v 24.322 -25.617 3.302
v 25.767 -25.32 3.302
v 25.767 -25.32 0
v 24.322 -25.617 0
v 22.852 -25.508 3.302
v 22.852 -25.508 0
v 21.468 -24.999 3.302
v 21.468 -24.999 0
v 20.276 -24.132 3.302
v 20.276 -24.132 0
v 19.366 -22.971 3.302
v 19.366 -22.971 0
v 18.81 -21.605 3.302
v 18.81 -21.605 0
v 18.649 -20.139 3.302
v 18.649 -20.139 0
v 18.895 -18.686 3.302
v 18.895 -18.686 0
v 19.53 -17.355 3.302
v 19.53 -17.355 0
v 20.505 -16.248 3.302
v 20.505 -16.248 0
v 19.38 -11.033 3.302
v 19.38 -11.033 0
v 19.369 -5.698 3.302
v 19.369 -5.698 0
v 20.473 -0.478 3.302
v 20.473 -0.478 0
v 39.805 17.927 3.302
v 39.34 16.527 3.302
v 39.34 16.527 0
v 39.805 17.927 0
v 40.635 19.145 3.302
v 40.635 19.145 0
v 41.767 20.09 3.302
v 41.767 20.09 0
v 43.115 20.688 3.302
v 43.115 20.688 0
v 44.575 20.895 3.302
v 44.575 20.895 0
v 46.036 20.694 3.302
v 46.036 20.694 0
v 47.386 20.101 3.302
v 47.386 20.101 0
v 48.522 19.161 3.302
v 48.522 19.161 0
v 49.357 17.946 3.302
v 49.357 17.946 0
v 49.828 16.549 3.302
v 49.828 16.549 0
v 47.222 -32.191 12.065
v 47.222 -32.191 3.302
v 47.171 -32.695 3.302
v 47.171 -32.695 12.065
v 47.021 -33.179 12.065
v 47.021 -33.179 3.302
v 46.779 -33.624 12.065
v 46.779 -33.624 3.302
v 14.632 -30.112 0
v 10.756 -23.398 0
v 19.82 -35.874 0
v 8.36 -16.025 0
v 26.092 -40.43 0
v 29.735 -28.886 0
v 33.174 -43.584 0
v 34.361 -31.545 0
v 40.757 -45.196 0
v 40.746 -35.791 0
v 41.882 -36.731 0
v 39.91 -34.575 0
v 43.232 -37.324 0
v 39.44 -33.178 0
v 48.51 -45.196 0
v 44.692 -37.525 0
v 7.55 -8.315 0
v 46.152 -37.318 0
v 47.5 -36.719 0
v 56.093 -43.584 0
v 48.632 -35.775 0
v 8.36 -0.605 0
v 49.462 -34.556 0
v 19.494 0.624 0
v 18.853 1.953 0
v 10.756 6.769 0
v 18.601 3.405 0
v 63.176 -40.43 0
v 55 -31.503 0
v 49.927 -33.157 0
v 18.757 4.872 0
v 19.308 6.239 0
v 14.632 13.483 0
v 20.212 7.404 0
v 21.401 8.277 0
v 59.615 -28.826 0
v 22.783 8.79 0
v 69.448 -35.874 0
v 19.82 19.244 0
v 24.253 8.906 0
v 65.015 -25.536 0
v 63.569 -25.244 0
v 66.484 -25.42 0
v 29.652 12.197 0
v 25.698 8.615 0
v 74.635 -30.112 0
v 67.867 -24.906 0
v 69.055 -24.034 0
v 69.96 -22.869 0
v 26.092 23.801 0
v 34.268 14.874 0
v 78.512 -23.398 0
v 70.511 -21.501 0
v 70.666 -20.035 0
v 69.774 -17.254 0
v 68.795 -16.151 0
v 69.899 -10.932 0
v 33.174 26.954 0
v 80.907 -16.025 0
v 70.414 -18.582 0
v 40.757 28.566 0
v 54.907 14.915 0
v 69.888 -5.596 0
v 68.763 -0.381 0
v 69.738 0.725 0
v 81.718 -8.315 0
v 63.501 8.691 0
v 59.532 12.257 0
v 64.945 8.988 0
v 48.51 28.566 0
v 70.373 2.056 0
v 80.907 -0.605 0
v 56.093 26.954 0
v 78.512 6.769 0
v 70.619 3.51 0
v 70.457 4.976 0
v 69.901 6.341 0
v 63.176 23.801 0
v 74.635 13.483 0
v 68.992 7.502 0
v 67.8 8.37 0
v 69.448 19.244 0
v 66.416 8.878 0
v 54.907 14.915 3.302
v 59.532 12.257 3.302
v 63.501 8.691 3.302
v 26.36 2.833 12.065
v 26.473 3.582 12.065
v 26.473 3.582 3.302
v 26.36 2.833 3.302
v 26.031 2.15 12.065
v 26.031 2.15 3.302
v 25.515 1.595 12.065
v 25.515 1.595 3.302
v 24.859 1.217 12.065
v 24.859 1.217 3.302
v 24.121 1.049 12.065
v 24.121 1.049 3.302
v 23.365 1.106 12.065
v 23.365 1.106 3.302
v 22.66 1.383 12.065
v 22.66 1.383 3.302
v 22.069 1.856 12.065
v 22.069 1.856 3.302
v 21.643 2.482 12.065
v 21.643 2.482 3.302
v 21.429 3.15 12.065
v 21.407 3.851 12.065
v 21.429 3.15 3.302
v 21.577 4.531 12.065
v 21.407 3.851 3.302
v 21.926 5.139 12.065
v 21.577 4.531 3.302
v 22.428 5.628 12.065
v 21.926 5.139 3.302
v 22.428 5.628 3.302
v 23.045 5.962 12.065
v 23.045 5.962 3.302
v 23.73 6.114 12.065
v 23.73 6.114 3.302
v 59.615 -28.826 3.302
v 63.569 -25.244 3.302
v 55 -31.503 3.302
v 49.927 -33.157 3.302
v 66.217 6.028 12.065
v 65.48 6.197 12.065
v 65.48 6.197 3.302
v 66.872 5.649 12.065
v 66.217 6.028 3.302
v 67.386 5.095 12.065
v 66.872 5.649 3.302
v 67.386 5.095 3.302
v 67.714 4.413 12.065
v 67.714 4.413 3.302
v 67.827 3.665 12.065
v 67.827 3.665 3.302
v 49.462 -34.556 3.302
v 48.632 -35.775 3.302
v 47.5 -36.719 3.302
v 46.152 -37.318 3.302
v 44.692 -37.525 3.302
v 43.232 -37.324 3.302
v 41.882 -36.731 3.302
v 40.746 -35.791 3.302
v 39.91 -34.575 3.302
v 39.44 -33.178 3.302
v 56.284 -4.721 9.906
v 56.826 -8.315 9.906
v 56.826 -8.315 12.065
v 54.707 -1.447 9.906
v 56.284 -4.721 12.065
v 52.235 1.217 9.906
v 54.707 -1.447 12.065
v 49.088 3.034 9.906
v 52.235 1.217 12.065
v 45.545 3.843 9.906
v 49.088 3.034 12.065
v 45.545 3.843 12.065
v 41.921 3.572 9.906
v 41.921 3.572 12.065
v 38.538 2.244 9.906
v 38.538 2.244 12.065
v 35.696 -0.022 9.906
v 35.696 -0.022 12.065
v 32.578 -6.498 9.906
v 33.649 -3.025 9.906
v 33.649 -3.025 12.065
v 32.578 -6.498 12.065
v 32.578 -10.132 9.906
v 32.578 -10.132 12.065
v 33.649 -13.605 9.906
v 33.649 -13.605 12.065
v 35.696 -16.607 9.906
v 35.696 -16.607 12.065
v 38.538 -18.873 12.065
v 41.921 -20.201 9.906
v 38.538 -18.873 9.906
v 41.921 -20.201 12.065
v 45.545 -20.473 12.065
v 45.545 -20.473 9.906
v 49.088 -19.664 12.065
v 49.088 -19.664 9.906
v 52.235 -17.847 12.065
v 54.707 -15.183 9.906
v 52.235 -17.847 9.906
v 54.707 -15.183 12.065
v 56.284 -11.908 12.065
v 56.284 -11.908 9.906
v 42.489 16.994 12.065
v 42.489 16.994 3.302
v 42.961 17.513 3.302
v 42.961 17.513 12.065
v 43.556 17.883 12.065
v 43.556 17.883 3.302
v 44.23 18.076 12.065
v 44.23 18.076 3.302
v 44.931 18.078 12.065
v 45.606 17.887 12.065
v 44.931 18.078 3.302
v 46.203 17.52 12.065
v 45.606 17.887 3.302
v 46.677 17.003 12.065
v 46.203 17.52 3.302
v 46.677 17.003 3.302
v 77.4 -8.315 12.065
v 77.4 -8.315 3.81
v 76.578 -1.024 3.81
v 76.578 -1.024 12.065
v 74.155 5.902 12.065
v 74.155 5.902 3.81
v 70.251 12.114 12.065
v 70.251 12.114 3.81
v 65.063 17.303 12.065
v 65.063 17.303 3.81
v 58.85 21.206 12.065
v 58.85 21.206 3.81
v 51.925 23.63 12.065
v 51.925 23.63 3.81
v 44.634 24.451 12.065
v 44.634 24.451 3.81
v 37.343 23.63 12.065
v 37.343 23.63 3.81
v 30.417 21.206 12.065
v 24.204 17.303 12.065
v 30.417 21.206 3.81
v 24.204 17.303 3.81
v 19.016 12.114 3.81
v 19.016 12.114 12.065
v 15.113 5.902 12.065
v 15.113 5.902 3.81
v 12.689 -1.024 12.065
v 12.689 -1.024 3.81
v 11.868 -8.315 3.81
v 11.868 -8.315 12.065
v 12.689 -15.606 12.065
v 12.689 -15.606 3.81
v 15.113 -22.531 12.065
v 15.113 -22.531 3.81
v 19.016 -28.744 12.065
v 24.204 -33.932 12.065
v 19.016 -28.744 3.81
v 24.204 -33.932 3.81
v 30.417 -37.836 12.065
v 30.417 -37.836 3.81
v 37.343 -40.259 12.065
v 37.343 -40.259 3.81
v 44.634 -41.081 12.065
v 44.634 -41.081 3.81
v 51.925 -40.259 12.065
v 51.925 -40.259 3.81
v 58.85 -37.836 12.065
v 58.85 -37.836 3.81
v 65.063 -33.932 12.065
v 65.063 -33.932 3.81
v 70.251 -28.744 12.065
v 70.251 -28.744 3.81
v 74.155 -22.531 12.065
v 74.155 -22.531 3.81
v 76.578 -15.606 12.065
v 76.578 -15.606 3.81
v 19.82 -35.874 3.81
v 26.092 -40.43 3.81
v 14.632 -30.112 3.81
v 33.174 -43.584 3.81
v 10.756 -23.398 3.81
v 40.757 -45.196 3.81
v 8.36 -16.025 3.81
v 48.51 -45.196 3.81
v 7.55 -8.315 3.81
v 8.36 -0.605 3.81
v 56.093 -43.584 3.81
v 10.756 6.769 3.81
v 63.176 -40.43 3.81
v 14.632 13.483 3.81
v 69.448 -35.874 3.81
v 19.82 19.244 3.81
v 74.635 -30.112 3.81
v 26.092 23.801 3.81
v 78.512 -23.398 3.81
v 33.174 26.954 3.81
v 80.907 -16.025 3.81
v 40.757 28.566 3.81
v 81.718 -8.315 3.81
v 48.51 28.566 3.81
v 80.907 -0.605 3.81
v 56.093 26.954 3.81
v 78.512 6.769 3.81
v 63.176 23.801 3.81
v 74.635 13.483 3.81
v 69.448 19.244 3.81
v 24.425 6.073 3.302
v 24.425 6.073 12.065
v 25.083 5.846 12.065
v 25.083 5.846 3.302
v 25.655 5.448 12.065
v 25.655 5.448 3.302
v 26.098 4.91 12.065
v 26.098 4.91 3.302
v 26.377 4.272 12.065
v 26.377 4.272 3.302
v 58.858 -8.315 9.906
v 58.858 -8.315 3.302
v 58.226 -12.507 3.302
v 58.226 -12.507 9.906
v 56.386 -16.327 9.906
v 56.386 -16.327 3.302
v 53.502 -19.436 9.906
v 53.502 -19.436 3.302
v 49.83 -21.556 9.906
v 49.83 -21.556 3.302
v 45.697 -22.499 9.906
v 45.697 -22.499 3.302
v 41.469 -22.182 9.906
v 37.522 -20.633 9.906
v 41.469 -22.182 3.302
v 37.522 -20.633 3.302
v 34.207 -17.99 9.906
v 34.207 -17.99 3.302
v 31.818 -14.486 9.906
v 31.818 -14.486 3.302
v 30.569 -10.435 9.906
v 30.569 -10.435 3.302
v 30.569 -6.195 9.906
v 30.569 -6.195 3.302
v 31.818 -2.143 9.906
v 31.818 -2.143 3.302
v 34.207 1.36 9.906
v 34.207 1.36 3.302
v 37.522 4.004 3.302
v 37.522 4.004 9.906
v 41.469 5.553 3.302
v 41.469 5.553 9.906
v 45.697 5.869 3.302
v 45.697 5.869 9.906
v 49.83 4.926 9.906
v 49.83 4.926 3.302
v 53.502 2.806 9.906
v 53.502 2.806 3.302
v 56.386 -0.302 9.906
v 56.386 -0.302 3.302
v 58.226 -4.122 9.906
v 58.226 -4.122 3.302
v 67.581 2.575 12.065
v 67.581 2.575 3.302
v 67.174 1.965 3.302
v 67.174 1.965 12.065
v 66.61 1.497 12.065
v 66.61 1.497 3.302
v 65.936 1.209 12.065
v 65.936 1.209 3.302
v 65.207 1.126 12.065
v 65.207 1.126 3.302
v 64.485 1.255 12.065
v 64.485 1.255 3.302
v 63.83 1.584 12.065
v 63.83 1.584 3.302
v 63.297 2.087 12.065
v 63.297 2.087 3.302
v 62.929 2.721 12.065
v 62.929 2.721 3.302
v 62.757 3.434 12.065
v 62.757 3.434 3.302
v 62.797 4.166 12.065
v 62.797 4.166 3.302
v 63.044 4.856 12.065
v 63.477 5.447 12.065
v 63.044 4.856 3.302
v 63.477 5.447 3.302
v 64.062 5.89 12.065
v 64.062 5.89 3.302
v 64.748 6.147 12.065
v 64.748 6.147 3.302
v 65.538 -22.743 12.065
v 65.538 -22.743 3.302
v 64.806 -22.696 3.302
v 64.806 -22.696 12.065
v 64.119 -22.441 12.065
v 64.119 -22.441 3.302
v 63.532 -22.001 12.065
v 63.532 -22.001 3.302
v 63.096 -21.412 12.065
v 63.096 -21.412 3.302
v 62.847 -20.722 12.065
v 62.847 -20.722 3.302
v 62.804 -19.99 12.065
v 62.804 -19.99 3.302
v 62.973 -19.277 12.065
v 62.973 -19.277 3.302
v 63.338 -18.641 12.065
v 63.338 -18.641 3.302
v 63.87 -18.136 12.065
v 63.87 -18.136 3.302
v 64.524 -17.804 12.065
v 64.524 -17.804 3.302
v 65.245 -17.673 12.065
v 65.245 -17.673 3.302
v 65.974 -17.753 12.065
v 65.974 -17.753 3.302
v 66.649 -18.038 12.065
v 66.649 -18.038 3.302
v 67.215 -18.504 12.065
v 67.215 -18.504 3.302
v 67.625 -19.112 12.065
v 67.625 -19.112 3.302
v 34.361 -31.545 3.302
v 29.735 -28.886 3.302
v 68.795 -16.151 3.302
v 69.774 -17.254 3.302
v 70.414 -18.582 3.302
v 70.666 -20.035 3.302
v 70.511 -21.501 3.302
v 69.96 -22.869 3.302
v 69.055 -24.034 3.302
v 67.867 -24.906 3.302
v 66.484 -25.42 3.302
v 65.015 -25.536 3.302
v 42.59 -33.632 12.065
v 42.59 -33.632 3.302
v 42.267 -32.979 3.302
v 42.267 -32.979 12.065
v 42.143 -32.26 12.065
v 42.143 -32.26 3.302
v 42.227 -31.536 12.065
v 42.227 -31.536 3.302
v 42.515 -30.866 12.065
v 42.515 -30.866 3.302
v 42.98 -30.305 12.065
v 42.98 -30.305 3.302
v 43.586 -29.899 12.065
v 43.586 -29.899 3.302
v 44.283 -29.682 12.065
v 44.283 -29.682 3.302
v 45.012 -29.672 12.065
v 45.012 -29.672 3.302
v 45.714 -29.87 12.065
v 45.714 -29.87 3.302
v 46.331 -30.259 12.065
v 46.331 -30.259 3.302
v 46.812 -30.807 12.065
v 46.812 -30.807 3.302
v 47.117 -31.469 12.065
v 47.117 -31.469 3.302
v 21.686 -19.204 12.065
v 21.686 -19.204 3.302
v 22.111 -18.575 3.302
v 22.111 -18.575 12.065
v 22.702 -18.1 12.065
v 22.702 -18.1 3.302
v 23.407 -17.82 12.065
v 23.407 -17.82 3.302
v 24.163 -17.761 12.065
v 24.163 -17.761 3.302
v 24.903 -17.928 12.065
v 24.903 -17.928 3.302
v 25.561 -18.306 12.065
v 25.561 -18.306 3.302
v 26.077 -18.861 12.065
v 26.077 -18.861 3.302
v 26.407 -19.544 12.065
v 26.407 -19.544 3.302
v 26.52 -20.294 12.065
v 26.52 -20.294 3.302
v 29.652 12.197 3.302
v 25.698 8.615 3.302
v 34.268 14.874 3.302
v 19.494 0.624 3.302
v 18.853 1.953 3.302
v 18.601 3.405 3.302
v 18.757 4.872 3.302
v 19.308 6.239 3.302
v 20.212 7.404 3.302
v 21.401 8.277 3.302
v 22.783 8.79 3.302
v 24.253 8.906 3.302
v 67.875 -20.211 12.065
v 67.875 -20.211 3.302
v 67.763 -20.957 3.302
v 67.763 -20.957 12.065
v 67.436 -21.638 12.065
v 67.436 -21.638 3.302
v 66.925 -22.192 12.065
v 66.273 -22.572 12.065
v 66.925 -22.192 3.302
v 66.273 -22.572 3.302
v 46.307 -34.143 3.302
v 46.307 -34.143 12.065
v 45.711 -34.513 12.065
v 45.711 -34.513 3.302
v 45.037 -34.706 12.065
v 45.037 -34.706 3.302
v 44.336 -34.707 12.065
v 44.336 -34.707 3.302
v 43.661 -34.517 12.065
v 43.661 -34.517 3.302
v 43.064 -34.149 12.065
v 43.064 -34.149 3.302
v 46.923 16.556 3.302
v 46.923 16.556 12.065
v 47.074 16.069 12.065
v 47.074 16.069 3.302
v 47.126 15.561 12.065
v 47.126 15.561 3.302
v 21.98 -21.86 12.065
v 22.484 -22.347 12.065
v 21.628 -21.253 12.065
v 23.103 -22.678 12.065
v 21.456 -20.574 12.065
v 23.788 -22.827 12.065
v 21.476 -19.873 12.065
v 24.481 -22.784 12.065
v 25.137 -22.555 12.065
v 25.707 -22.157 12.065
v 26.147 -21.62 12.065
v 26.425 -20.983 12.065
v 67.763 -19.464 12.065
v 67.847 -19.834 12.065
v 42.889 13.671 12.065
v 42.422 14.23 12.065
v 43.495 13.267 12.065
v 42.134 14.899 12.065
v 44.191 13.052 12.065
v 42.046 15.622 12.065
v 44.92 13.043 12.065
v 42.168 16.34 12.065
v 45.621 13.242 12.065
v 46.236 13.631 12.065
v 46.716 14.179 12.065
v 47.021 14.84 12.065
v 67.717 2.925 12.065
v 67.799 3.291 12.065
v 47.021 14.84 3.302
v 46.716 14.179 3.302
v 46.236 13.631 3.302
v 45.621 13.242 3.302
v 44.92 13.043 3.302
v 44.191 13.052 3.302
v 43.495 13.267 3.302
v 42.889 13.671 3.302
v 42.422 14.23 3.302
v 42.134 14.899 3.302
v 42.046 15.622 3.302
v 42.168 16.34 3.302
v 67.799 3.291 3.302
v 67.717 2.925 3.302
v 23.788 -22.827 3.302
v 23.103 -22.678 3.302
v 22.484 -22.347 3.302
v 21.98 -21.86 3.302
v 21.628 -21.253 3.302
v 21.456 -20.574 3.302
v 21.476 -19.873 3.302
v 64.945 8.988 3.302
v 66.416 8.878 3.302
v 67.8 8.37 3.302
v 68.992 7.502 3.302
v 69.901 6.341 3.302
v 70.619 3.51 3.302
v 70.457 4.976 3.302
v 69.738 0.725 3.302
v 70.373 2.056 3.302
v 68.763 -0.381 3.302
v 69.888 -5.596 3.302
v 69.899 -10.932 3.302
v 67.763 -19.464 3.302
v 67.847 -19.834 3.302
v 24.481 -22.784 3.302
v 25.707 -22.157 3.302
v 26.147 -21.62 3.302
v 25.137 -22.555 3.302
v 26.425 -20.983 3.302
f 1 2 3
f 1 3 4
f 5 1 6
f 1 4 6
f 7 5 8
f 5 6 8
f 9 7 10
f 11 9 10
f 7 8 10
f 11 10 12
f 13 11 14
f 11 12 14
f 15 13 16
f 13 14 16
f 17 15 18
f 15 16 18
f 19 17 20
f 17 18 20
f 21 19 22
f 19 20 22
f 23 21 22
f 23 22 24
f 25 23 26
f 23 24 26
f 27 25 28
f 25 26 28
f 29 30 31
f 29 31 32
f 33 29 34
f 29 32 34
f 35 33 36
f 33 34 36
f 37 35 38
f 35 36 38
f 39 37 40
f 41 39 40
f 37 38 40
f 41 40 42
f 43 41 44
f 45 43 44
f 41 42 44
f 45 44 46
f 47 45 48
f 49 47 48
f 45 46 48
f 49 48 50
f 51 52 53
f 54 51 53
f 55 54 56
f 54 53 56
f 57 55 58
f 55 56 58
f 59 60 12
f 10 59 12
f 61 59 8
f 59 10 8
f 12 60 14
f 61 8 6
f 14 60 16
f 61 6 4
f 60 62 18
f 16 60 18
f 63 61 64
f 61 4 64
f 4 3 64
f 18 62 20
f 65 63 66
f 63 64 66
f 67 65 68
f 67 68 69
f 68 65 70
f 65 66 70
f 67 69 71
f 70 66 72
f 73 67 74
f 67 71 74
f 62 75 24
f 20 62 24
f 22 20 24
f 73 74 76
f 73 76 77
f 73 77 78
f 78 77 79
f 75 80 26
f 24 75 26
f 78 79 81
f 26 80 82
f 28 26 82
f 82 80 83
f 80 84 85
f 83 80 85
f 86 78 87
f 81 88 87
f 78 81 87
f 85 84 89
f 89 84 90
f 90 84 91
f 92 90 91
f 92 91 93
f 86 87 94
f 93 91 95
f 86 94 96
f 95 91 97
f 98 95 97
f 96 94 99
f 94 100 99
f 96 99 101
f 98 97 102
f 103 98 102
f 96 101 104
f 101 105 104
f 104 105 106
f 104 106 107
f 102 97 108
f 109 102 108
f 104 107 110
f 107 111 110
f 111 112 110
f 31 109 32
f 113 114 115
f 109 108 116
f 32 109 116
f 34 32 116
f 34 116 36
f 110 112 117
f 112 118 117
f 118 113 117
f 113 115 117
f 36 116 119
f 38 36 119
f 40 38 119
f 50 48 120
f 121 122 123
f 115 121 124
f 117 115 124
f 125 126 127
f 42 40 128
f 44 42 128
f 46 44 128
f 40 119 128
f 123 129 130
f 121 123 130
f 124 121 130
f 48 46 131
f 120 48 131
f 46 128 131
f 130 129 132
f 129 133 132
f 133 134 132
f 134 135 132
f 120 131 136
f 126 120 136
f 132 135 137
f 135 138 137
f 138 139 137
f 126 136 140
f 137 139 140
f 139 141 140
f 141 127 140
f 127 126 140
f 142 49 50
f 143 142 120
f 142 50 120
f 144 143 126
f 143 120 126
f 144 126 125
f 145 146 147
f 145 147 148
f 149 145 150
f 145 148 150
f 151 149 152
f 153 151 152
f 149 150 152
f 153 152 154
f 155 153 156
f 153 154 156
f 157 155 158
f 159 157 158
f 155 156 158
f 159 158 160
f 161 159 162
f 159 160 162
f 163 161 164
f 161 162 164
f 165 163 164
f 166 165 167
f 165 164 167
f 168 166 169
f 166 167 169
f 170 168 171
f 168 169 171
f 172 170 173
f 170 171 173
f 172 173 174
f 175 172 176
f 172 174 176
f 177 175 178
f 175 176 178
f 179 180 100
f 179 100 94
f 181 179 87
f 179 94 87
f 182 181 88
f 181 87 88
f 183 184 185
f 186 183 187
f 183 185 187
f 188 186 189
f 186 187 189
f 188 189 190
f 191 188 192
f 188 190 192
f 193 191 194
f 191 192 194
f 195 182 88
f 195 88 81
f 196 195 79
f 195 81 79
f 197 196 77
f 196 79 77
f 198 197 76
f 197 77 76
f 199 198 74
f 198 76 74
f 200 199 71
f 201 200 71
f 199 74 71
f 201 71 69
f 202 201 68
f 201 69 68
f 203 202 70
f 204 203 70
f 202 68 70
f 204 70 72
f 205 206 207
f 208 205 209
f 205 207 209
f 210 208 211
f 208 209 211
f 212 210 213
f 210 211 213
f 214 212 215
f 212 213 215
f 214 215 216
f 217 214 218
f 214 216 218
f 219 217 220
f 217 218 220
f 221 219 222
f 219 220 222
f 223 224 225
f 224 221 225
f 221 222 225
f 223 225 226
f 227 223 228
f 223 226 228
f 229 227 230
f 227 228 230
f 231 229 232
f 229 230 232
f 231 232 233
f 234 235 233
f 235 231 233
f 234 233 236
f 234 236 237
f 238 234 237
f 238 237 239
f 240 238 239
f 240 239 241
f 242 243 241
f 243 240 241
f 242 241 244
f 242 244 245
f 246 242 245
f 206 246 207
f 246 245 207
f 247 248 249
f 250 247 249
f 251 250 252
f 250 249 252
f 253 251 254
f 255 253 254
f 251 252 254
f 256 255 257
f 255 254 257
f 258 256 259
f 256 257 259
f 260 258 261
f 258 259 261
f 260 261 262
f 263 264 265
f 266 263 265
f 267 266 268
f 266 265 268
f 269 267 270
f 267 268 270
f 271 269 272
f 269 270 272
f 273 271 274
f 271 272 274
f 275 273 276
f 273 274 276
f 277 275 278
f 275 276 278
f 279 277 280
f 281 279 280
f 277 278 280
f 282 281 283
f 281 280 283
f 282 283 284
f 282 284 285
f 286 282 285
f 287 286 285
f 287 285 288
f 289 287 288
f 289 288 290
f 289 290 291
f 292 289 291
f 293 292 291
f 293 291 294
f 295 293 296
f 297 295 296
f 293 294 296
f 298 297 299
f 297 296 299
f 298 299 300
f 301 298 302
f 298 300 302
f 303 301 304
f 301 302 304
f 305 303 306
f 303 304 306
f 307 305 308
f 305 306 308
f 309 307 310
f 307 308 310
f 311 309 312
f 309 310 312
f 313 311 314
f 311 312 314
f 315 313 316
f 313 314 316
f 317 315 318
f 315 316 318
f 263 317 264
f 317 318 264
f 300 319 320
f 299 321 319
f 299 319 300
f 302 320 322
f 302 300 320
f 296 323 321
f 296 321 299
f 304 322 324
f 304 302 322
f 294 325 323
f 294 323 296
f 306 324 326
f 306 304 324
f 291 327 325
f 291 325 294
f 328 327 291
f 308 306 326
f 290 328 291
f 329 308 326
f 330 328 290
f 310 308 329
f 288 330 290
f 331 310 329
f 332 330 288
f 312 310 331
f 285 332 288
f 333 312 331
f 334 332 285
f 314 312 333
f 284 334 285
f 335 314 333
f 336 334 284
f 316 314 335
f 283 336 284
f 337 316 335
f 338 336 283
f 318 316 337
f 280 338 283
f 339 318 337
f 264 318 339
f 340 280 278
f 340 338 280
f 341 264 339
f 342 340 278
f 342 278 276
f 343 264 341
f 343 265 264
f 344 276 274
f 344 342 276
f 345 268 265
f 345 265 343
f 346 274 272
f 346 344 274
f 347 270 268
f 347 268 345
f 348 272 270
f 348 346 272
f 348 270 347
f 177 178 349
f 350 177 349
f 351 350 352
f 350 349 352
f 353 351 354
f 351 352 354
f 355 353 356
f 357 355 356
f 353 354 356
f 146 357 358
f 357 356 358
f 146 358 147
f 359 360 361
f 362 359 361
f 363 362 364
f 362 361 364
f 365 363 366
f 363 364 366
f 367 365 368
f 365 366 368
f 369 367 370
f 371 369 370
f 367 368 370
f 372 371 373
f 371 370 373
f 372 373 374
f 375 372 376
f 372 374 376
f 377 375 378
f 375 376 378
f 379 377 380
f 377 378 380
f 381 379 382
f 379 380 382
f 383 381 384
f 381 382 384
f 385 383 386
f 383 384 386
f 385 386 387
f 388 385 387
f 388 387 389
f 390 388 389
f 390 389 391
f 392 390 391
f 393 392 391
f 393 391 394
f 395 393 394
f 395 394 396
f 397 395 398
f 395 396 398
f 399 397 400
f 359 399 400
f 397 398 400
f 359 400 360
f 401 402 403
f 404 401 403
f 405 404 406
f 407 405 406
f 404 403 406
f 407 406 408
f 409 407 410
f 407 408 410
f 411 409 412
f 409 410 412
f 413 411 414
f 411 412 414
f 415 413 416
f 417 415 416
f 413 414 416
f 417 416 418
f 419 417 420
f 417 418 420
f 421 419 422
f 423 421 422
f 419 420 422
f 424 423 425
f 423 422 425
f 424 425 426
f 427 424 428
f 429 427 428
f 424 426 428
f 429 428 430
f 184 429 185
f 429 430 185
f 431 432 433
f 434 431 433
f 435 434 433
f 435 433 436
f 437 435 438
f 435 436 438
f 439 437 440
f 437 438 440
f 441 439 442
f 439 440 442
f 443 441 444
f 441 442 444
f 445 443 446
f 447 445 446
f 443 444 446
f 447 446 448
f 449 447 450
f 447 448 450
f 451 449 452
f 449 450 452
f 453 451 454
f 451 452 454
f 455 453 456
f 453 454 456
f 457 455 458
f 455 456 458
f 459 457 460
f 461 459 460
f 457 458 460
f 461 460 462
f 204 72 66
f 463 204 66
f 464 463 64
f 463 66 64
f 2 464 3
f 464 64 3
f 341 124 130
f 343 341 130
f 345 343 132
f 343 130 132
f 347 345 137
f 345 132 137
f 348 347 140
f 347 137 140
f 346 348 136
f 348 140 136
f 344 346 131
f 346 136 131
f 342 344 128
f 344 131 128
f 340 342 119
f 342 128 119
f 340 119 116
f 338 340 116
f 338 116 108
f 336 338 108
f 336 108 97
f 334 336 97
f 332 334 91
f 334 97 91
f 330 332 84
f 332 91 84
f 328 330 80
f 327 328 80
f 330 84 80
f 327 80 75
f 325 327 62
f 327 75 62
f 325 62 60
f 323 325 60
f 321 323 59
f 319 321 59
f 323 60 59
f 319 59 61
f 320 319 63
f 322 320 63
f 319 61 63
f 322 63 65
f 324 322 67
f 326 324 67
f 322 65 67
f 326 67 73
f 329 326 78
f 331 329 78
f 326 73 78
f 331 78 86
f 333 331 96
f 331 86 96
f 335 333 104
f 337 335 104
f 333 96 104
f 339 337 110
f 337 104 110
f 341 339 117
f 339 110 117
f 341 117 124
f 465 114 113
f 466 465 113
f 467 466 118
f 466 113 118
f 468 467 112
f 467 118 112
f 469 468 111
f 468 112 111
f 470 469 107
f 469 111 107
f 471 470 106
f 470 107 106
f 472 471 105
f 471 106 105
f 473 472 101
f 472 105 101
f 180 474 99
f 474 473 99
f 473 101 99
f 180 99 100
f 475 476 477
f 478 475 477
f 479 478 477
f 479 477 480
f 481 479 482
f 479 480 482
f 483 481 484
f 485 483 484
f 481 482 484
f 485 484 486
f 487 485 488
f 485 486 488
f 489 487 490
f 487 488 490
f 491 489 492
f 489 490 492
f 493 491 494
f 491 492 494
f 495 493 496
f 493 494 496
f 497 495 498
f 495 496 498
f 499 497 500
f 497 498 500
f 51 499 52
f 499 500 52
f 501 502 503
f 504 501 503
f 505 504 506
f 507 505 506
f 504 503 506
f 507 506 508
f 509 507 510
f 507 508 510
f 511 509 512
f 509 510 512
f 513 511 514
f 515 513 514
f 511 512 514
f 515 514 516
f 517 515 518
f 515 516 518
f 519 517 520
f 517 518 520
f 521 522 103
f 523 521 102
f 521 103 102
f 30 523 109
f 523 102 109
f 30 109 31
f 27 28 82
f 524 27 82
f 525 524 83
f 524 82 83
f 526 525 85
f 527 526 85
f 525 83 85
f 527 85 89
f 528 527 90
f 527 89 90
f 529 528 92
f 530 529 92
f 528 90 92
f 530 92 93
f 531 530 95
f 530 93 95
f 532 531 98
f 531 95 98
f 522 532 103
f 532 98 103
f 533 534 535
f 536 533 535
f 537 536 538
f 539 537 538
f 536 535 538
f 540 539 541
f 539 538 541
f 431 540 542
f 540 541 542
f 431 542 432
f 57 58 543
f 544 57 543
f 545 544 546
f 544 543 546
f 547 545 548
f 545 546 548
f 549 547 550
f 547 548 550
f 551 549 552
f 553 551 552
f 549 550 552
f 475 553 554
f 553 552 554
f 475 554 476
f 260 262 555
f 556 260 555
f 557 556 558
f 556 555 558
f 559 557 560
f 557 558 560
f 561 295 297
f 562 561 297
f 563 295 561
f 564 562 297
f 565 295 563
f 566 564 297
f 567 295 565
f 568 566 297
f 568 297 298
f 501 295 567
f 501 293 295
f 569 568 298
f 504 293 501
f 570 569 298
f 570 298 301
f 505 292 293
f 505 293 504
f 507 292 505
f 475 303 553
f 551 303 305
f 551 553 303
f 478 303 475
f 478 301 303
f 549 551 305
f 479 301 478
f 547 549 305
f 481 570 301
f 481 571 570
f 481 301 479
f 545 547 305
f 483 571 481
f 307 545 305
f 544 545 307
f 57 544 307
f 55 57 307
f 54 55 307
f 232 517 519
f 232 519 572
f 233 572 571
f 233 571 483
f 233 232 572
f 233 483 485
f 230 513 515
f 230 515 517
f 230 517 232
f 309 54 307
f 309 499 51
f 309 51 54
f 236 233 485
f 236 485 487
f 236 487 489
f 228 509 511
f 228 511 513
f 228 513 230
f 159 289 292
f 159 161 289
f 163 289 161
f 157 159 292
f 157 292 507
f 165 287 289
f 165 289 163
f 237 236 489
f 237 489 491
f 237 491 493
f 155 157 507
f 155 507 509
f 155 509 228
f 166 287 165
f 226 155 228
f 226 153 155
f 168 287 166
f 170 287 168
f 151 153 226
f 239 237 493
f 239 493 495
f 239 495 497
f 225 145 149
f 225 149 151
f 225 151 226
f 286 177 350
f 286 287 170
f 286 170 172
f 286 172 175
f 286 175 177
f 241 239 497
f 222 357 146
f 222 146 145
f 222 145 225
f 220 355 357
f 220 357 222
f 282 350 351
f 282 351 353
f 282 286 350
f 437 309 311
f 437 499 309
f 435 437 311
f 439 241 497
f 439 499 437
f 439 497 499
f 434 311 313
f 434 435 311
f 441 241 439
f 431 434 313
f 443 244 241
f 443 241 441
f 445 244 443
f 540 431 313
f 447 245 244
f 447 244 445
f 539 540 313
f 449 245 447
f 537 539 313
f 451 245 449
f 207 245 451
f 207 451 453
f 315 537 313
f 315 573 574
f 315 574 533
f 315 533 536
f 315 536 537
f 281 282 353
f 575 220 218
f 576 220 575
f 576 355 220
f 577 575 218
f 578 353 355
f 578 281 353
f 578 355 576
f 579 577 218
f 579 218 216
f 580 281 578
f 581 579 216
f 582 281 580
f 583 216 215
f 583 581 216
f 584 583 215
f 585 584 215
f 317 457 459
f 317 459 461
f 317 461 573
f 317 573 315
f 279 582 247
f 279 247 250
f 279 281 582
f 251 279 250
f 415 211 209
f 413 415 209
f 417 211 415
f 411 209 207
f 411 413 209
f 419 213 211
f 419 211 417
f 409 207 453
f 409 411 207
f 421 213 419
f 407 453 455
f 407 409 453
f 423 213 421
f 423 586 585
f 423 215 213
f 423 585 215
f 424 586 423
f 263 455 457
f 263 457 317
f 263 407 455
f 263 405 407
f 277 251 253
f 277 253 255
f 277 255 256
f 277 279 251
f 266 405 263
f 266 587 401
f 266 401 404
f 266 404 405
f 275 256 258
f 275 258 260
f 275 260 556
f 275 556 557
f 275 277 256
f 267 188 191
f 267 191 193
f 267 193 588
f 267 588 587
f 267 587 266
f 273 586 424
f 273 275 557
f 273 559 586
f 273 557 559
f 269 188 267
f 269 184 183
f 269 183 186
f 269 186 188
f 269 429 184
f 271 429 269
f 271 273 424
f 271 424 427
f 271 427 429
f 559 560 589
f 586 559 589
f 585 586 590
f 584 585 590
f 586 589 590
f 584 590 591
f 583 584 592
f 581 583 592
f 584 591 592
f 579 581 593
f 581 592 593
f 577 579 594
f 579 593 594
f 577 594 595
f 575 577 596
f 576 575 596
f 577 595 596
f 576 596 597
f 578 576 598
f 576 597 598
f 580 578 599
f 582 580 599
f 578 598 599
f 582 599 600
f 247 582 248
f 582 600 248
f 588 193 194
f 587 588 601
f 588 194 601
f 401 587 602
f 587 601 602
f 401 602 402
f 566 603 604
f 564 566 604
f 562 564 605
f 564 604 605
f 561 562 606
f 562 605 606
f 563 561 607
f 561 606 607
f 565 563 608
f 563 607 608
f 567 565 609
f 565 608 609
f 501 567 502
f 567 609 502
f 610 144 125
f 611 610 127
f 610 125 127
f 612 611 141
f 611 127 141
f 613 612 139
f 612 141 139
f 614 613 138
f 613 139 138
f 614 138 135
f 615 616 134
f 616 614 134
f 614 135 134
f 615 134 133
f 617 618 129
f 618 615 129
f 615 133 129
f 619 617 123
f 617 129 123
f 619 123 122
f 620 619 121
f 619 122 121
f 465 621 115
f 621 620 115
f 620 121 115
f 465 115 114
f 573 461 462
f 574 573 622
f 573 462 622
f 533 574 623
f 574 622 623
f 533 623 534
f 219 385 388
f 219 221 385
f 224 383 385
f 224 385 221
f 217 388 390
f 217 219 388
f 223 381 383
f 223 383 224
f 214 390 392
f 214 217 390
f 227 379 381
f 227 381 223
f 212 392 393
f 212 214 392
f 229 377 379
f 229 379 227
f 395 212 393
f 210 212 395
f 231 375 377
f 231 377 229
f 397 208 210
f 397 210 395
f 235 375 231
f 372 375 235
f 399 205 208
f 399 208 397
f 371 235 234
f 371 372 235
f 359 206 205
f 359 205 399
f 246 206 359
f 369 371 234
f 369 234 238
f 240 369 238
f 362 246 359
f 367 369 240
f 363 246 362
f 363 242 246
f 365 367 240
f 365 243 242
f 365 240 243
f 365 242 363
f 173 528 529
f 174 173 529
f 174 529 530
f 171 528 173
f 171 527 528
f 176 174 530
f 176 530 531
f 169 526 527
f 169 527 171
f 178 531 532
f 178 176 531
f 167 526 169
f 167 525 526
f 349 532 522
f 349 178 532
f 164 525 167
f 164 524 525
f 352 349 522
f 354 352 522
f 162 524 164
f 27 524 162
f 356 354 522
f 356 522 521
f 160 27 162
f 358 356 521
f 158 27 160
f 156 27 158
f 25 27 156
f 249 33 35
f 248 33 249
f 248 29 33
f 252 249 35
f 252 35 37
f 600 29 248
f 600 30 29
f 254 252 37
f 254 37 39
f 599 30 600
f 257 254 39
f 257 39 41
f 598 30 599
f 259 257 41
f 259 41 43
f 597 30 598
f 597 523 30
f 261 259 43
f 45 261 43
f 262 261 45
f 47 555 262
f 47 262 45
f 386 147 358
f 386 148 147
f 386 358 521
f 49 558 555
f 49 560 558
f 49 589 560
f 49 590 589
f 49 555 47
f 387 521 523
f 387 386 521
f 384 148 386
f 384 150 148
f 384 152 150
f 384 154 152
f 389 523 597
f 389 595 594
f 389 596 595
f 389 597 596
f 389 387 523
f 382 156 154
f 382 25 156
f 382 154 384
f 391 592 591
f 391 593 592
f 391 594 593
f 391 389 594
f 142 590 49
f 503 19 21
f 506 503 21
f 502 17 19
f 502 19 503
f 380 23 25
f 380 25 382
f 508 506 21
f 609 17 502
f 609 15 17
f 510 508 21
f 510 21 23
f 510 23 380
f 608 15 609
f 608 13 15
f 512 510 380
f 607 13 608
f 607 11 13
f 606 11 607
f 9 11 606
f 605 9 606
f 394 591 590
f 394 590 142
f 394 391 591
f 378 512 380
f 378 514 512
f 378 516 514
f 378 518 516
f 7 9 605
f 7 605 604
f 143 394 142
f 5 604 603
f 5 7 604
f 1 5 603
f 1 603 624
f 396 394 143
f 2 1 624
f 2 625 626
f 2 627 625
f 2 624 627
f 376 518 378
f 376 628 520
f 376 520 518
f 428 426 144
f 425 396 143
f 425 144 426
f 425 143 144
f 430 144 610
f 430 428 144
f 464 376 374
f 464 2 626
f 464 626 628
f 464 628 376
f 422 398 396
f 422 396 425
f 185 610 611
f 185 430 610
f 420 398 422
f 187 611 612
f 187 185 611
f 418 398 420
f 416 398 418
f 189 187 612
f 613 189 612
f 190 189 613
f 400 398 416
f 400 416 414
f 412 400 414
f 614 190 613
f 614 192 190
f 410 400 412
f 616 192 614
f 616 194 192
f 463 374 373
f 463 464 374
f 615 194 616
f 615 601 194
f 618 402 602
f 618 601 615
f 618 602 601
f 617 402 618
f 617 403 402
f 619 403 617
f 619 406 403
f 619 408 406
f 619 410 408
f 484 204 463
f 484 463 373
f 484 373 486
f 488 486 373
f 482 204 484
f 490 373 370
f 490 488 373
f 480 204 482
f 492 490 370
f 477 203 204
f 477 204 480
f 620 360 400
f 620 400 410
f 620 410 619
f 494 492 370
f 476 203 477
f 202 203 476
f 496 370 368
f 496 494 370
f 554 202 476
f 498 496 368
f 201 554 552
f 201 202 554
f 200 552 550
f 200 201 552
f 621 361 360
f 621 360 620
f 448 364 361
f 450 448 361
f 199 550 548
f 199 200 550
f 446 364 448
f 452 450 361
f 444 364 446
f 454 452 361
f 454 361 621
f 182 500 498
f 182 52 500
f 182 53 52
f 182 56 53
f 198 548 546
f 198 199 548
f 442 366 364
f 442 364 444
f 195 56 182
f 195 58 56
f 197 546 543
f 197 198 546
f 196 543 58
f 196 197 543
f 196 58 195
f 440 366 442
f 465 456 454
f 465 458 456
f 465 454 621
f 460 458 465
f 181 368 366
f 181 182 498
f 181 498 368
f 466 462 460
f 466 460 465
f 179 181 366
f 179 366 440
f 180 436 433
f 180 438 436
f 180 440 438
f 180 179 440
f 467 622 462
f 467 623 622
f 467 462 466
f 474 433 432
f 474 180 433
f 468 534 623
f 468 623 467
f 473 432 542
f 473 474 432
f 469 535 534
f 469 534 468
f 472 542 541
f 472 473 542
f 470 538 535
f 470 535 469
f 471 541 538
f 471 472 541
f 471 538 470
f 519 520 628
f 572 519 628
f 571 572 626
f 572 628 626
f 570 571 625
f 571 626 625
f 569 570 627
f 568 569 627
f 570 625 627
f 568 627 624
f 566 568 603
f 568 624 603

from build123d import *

# Parameters (mm, degrees)
F0_R      = 37.084
F1_DEPTH  = 3.81
F2_R      = 32.766
F3_DEPTH  = 8.255
F4_R      = 12.192
F5_DEPTH  = 12.065
F6_R      = 25.4
F6_R_2    = 12.192
F7_DEPTH  = 3.302
F8_R      = 14.224
F8_R_2    = 12.192
F9_DEPTH  = 6.604
F11_DEPTH = 12.192
F10_R     = 5.334
F10_R_2   = 2.54
F12_DEPTH = 3.302


with BuildPart() as f1:
    # F0 (on Top) → F1 (new body)
    with BuildSketch(Plane.XY):
        with Locations((44.6336865425, -8.3147734404)):
            Circle(F0_R)
    extrude(amount=F1_DEPTH)

    # F2 (on face) → F3 (join)
    with BuildSketch(Plane.XY.offset(3.81)):
        with Locations((44.6336865425, -8.3147734404)):
            Circle(F2_R)
    extrude(amount=F3_DEPTH)

    # F4 (on face) → F5 (cut)
    with BuildSketch(Plane.XY.offset(12.065)):
        with Locations((44.6336865425, -8.3147734404)):
            Circle(F4_R)
    extrude(amount=-F5_DEPTH, mode=Mode.SUBTRACT)

    # F6 (on face) → F7 (cut)
    with BuildSketch(Plane(origin=(0, 0, 0), x_dir=(1, 0, 0), z_dir=(0, 0, -1))):
        with Locations((44.6336865425, 8.3147734404)):
            Circle(F6_R)
        with Locations((44.6336865425, 8.3147734404)):
            Circle(F6_R_2, mode=Mode.SUBTRACT)
    extrude(amount=-F7_DEPTH, mode=Mode.SUBTRACT)

    # F8 (on face) → F9 (cut)
    with BuildSketch(Plane(origin=(0, 0, 3.302), x_dir=(1, 0, 0), z_dir=(0, 0, -1))):
        with Locations((44.6336865425, 8.3147734404)):
            Circle(F8_R)
        with Locations((44.6336865425, 8.3147734404)):
            Circle(F8_R_2, mode=Mode.SUBTRACT)
    extrude(amount=-F9_DEPTH, mode=Mode.SUBTRACT)

    # F10 (on face) → F11 (cut)
    with BuildSketch(Plane(origin=(0, 0, 0), x_dir=(1, 0, 0), z_dir=(0, 0, -1))):
        with BuildLine():
            ThreePointArc((26.4725169512, -3.5816526428), (24.4962514712, -1.1050009937), (21.6427505016, -2.4823030141))
            ThreePointArc((21.6427505016, -2.4823030141), (22.6111657007, -4.3409989885), (23.7295214672, -6.1135280018))
            ThreePointArc((23.7295214672, -6.1135280018), (25.6553041509, -5.4480942478), (26.4725169512, -3.5816526428))
        make_face()
        with BuildLine():
            ThreePointArc((23.7295214672, -6.1135280018), (22.6111657007, -4.3409989885), (21.6427505016, -2.4823030141))
            ThreePointArc((21.6427505016, -2.4823030141), (21.730264867, -4.8472298857), (23.7295214672, -6.1135280018))
        make_face()
        with BuildLine():
            ThreePointArc((26.5204945446, 20.2942991529), (25.7070287844, 22.1572751374), (23.7876760259, 22.8269698814))
            ThreePointArc((23.7876760259, 22.8269698814), (22.6622056937, 21.0589497303), (21.6863284225, 19.2041607194))
            ThreePointArc((21.6863284225, 19.2041607194), (24.5392512224, 17.8165197085), (26.5204945446, 20.2942991529))
        make_face()
        with BuildLine():
            ThreePointArc((21.6863284225, 19.2041607194), (22.6622056937, 21.0589497303), (23.7876760259, 22.8269698814))
            ThreePointArc((23.7876760259, 22.8269698814), (21.7833464597, 21.5687167819), (21.6863284225, 19.2041607194))
        make_face()
        with BuildLine():
            ThreePointArc((47.2216641359, 32.1907252361), (47.1083746403, 32.9408426453), (46.7786120668, 33.6240463358))
            ThreePointArc((46.7786120668, 33.6240463358), (44.6847265355, 33.7147221592), (42.5904934978, 33.6324621615))
            ThreePointArc((42.5904934978, 33.6324621615), (43.9266718912, 29.7655269534), (47.2216641359, 32.1907252361))
        make_face()
        with BuildLine():
            ThreePointArc((42.5904934978, 33.6324621615), (44.6847265355, 33.7147221592), (46.7786120668, 33.6240463358))
            ThreePointArc((46.7786120668, 33.6240463358), (44.6867681352, 34.7307201079), (42.5904934978, 33.6324621615))
        make_face()
        with BuildLine():
            ThreePointArc((67.6246225834, 19.1118498948), (66.6562073843, 20.9705458693), (65.5378516178, 22.7430748825))
            ThreePointArc((65.5378516178, 22.7430748825), (63.1326040496, 18.9456222806), (67.6246225834, 19.1118498948))
        make_face()
        with BuildLine():
            ThreePointArc((67.6246225834, 19.1118498948), (67.8115077829, 19.6474650036), (67.8748561338, 20.2111995235))
            ThreePointArc((67.8748561338, 20.2111995235), (67.2012977387, 21.9339867232), (65.5378516178, 22.7430748825))
            ThreePointArc((65.5378516178, 22.7430748825), (66.6562073843, 20.9705458693), (67.6246225834, 19.1118498948))
        make_face()
        with BuildLine():
            ThreePointArc((67.8268785404, -3.6647522722), (67.7646579848, -3.1059955944), (67.5810446625, -2.5746138386))
            ThreePointArc((67.5810446625, -2.5746138386), (66.6051673914, -4.4294028496), (65.4796970591, -6.1974230006))
            ThreePointArc((65.4796970591, -6.1974230006), (67.1498545249, -5.391286512), (67.8268785404, -3.6647522722))
        make_face()
        with BuildLine():
            ThreePointArc((65.4796970591, -6.1974230006), (66.6051673914, -4.4294028496), (67.5810446625, -2.5746138386))
            ThreePointArc((67.5810446625, -2.5746138386), (63.0897304555, -2.3903346432), (65.4796970591, -6.1974230006))
        make_face()
        with BuildLine():
            ThreePointArc((42.4887610182, -16.9944994551), (44.5806049498, -18.1011732272), (46.6768795873, -17.0029152808))
            ThreePointArc((46.6768795873, -17.0029152808), (44.5826465496, -17.0851752785), (42.4887610182, -16.9944994551))
        make_face()
        with BuildLine():
            ThreePointArc((42.4887610182, -16.9944994551), (44.5826465496, -17.0851752785), (46.6768795873, -17.0029152808))
            ThreePointArc((46.6768795873, -17.0029152808), (47.0109072318, -16.3161706001), (47.1257089491, -15.5611783553))
            ThreePointArc((47.1257089491, -15.5611783553), (43.8355915399, -13.1344678509), (42.4887610182, -16.9944994551))
        make_face()
    extrude(amount=-F11_DEPTH, mode=Mode.SUBTRACT)

    # F10 (on face) → F12 (cut)
    with BuildSketch(Plane(origin=(0, 0, 0), x_dir=(1, 0, 0), z_dir=(0, 0, -1))):
        with Locations((44.6816641359, 32.1907252361)):
            Circle(F10_R)
        with Locations((44.6816641359, 32.1907252361)):
            Circle(F10_R_2, mode=Mode.SUBTRACT)
        with Locations((65.3348561338, 20.2111995235)):
            Circle(F10_R)
        with Locations((65.3348561338, 20.2111995235)):
            Circle(F10_R_2, mode=Mode.SUBTRACT)
        with Locations((65.2868785404, -3.6647522722)):
            Circle(F10_R)
        with Locations((65.2868785404, -3.6647522722)):
            Circle(F10_R_2, mode=Mode.SUBTRACT)
        with Locations((44.5857089491, -15.5611783553)):
            Circle(F10_R)
        with Locations((44.5857089491, -15.5611783553)):
            Circle(F10_R_2, mode=Mode.SUBTRACT)
        with Locations((23.9325169512, -3.5816526428)):
            Circle(F10_R)
        with Locations((23.9325169512, -3.5816526428)):
            Circle(F10_R_2, mode=Mode.SUBTRACT)
        with Locations((23.9804945446, 20.2942991529)):
            Circle(F10_R)
        with Locations((23.9804945446, 20.2942991529)):
            Circle(F10_R_2, mode=Mode.SUBTRACT)
    extrude(amount=-F12_DEPTH, mode=Mode.SUBTRACT)


solid = f1.part
